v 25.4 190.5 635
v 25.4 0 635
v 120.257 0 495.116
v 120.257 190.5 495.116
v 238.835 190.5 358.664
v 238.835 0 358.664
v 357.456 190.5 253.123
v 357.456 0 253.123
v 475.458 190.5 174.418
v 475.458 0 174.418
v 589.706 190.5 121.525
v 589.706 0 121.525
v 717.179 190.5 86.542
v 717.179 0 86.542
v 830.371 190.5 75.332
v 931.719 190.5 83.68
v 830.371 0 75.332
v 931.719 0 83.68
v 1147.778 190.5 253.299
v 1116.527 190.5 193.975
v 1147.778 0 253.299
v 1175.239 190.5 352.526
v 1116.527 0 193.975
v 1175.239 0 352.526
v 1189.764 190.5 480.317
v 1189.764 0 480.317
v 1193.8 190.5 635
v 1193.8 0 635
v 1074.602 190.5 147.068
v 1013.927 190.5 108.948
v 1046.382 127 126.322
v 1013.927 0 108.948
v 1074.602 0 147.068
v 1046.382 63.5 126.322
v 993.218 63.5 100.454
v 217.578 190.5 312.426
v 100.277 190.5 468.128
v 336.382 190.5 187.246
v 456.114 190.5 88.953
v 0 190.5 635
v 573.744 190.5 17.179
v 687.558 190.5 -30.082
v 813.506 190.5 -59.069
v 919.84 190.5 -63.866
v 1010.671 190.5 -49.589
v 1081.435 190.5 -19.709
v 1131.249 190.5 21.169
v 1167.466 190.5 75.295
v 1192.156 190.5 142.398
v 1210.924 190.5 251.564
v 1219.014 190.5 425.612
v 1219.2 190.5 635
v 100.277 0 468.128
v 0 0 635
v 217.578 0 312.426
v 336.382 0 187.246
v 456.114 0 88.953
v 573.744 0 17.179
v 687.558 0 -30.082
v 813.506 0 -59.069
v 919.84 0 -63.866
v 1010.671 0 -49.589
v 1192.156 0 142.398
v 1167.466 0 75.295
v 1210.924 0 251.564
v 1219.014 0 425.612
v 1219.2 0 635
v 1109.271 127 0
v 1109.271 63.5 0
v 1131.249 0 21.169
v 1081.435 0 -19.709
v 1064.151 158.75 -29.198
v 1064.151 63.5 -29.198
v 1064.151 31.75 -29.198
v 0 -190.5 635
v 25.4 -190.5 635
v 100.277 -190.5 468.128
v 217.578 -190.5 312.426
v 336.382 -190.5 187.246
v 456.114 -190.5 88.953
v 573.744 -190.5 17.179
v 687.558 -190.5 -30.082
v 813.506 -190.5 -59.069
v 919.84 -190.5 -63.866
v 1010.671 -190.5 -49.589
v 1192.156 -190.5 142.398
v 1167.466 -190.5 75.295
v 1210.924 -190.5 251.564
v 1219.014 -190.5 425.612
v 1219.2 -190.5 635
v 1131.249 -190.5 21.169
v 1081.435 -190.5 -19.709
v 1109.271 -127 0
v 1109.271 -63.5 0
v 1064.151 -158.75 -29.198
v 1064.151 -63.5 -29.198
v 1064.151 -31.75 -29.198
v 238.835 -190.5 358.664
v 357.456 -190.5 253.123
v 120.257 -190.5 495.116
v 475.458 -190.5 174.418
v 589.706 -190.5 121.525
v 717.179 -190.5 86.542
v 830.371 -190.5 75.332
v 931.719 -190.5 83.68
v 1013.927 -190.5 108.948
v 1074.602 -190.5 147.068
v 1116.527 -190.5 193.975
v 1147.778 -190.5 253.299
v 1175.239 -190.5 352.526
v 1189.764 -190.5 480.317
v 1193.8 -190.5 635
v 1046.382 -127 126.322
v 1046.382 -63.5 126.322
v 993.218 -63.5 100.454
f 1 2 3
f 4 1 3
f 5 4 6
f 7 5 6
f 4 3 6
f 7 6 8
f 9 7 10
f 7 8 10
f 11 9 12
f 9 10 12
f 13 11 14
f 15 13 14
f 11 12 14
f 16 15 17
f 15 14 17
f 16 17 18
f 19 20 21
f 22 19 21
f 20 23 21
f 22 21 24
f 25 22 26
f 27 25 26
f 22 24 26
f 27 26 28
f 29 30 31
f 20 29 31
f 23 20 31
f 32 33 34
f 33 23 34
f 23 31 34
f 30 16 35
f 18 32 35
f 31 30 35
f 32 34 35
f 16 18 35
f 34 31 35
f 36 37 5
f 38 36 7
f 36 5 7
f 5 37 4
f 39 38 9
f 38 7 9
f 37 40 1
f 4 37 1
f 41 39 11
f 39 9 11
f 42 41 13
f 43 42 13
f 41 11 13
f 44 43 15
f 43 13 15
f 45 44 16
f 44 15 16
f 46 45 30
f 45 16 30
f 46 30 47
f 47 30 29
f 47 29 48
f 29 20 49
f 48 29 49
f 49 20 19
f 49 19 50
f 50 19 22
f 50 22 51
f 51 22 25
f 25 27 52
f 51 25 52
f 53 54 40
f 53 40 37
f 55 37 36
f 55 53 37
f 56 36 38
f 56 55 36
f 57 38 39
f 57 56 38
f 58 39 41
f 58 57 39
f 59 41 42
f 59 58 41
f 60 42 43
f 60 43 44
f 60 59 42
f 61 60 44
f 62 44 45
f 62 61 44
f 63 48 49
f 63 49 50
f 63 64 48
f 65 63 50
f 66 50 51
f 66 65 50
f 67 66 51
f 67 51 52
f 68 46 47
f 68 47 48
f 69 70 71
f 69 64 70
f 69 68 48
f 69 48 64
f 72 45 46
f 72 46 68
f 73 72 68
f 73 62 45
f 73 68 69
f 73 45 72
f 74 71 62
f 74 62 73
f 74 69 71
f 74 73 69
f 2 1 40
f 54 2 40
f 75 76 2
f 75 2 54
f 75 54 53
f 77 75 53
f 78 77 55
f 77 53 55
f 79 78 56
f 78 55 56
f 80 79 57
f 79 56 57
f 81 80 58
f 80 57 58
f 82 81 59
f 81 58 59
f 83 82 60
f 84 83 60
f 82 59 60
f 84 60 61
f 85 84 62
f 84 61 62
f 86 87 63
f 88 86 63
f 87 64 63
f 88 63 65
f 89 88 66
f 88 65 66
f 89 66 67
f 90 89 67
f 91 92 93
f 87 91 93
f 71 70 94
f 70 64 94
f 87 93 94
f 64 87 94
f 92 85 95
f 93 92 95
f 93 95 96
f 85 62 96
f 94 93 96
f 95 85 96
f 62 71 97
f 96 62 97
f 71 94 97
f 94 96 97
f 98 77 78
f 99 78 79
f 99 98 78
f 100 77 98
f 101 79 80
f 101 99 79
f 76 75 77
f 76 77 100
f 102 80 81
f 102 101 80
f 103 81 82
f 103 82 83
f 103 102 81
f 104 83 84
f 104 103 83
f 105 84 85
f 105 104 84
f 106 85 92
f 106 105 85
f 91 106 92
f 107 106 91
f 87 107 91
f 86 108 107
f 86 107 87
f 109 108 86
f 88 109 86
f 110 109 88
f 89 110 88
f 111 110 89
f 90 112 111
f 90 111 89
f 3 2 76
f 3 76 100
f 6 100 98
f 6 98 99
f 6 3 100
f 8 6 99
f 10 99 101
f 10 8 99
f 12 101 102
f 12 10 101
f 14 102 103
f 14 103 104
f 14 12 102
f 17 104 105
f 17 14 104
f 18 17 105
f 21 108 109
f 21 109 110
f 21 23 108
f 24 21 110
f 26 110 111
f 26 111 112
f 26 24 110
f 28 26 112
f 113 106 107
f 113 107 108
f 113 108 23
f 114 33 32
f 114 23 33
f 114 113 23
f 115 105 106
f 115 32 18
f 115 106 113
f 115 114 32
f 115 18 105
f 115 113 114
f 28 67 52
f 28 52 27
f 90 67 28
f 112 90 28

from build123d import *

# Parameters (mm, degrees)
F1_DEPTH = 190.5


with BuildPart() as f1:
    # F0 (on Front) → F1 (new body, symmetric)
    with BuildSketch(Plane.XZ):
        with BuildLine():
            Line((25.4, 635), (0, 635))
            add(Edge.make_bspline(
                [(0, 635), (144.0746518326, 365.7923622228), (523.4506210955, -79.4932444453), (1238.0058035162, -91.9382880073), (1219.2, 317.5), (1219.2, 635)],
                knots=[0, 0, 0, 0, 0.3832794358, 0.6720513491, 1, 1, 1, 1], degree=3))
            Line((1219.2, 635), (1193.8, 635))
            add(Edge.make_bspline(
                [(25.4, 635), (134.1248416572, 452.289338749), (469.5328017827, 70.0413728303), (1141.0094912555, 42.5613148589), (1193.8, 364.2124326753), (1193.8, 635)],
                knots=[0, 0, 0, 0, 0.3670965553, 0.6814603617, 1, 1, 1, 1], degree=3))
        make_face()
    extrude(amount=F1_DEPTH, both=True)


solid = f1.part
